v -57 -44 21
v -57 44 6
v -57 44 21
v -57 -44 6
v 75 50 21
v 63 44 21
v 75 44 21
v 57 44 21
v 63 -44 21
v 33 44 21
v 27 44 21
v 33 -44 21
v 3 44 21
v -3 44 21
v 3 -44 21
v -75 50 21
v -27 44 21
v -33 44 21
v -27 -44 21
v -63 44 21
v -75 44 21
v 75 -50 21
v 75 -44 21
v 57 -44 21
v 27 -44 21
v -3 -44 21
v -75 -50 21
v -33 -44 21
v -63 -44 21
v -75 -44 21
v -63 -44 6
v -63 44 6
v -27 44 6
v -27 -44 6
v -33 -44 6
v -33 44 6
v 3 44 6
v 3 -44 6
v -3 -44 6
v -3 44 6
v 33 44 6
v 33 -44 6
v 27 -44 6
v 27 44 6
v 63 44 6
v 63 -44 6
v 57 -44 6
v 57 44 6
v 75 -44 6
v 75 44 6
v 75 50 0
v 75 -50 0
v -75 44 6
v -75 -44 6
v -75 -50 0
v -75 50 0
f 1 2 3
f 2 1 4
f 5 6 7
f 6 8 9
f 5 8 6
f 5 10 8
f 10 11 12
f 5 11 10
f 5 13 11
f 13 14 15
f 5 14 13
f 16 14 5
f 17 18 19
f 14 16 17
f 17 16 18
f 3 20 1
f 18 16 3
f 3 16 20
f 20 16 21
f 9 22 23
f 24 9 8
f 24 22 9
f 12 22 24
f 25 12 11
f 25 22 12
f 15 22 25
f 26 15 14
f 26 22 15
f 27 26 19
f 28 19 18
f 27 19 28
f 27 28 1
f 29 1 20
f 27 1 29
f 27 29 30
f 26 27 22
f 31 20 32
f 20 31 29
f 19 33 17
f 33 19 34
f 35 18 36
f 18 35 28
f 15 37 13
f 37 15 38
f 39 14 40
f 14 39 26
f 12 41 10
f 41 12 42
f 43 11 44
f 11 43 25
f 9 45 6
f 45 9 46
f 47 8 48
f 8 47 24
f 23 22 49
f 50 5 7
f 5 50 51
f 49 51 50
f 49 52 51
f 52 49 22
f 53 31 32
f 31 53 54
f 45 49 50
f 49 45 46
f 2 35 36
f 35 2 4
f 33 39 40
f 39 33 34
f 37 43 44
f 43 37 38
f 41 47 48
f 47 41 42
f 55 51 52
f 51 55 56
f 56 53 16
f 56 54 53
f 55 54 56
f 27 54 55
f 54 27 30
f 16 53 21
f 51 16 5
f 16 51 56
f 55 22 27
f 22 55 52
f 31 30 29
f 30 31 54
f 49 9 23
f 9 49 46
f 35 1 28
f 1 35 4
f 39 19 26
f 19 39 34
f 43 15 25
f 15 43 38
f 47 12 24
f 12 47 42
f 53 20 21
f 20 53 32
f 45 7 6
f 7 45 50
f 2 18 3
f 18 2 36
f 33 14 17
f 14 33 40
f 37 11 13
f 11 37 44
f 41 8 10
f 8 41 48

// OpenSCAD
$fn = 32;

// ----------------------------------------------------------------------
// Rib frame 150 x 100 x 21
// 5 ribs at 30 mm pitch
// ----------------------------------------------------------------------

// --- parameters (mm) ---
frame = [150, 100, 6];  // base plate size (x, y, z)
rail_w = 6;             // side rail width
ribs = 5;               // number of ribs
rib_t = 6;              // rib thickness
rib_h = 15;             // rib height above the base plate
pitch = 30;             // pitch between rib centres

// --- derived feature positions (mm) ---
span = (ribs - 1) * pitch;          // = 120   distance between the outer ribs
origin_x = -span / 2;               // = -60   X of the first rib
rib_len = frame[1] - 2 * rail_w + 2;  // = 90   rib length, 1 mm into each rail
feature_centers = [
  [origin_x + 0 * pitch, 0],
  [origin_x + 1 * pitch, 0],
  [origin_x + 2 * pitch, 0],
  [origin_x + 3 * pitch, 0],
  [origin_x + 4 * pitch, 0]
];   // rib centre line, drives the rib loop

// base plate, two side rails, then the ribs read straight off feature_centers
union() {
  translate([-frame[0] / 2, -frame[1] / 2, 0]) cube(frame);
  translate([-frame[0] / 2, -frame[1] / 2, 0]) cube([frame[0], rail_w, frame[2] + rib_h]);
  translate([-frame[0] / 2, frame[1] / 2 - rail_w, 0]) cube([frame[0], rail_w, frame[2] + rib_h]);
  for (centre = feature_centers)
    translate([centre[0] - rib_t / 2, centre[1] - rib_len / 2, frame[2] - 1])
      cube([rib_t, rib_len, rib_h + 1]);
}
